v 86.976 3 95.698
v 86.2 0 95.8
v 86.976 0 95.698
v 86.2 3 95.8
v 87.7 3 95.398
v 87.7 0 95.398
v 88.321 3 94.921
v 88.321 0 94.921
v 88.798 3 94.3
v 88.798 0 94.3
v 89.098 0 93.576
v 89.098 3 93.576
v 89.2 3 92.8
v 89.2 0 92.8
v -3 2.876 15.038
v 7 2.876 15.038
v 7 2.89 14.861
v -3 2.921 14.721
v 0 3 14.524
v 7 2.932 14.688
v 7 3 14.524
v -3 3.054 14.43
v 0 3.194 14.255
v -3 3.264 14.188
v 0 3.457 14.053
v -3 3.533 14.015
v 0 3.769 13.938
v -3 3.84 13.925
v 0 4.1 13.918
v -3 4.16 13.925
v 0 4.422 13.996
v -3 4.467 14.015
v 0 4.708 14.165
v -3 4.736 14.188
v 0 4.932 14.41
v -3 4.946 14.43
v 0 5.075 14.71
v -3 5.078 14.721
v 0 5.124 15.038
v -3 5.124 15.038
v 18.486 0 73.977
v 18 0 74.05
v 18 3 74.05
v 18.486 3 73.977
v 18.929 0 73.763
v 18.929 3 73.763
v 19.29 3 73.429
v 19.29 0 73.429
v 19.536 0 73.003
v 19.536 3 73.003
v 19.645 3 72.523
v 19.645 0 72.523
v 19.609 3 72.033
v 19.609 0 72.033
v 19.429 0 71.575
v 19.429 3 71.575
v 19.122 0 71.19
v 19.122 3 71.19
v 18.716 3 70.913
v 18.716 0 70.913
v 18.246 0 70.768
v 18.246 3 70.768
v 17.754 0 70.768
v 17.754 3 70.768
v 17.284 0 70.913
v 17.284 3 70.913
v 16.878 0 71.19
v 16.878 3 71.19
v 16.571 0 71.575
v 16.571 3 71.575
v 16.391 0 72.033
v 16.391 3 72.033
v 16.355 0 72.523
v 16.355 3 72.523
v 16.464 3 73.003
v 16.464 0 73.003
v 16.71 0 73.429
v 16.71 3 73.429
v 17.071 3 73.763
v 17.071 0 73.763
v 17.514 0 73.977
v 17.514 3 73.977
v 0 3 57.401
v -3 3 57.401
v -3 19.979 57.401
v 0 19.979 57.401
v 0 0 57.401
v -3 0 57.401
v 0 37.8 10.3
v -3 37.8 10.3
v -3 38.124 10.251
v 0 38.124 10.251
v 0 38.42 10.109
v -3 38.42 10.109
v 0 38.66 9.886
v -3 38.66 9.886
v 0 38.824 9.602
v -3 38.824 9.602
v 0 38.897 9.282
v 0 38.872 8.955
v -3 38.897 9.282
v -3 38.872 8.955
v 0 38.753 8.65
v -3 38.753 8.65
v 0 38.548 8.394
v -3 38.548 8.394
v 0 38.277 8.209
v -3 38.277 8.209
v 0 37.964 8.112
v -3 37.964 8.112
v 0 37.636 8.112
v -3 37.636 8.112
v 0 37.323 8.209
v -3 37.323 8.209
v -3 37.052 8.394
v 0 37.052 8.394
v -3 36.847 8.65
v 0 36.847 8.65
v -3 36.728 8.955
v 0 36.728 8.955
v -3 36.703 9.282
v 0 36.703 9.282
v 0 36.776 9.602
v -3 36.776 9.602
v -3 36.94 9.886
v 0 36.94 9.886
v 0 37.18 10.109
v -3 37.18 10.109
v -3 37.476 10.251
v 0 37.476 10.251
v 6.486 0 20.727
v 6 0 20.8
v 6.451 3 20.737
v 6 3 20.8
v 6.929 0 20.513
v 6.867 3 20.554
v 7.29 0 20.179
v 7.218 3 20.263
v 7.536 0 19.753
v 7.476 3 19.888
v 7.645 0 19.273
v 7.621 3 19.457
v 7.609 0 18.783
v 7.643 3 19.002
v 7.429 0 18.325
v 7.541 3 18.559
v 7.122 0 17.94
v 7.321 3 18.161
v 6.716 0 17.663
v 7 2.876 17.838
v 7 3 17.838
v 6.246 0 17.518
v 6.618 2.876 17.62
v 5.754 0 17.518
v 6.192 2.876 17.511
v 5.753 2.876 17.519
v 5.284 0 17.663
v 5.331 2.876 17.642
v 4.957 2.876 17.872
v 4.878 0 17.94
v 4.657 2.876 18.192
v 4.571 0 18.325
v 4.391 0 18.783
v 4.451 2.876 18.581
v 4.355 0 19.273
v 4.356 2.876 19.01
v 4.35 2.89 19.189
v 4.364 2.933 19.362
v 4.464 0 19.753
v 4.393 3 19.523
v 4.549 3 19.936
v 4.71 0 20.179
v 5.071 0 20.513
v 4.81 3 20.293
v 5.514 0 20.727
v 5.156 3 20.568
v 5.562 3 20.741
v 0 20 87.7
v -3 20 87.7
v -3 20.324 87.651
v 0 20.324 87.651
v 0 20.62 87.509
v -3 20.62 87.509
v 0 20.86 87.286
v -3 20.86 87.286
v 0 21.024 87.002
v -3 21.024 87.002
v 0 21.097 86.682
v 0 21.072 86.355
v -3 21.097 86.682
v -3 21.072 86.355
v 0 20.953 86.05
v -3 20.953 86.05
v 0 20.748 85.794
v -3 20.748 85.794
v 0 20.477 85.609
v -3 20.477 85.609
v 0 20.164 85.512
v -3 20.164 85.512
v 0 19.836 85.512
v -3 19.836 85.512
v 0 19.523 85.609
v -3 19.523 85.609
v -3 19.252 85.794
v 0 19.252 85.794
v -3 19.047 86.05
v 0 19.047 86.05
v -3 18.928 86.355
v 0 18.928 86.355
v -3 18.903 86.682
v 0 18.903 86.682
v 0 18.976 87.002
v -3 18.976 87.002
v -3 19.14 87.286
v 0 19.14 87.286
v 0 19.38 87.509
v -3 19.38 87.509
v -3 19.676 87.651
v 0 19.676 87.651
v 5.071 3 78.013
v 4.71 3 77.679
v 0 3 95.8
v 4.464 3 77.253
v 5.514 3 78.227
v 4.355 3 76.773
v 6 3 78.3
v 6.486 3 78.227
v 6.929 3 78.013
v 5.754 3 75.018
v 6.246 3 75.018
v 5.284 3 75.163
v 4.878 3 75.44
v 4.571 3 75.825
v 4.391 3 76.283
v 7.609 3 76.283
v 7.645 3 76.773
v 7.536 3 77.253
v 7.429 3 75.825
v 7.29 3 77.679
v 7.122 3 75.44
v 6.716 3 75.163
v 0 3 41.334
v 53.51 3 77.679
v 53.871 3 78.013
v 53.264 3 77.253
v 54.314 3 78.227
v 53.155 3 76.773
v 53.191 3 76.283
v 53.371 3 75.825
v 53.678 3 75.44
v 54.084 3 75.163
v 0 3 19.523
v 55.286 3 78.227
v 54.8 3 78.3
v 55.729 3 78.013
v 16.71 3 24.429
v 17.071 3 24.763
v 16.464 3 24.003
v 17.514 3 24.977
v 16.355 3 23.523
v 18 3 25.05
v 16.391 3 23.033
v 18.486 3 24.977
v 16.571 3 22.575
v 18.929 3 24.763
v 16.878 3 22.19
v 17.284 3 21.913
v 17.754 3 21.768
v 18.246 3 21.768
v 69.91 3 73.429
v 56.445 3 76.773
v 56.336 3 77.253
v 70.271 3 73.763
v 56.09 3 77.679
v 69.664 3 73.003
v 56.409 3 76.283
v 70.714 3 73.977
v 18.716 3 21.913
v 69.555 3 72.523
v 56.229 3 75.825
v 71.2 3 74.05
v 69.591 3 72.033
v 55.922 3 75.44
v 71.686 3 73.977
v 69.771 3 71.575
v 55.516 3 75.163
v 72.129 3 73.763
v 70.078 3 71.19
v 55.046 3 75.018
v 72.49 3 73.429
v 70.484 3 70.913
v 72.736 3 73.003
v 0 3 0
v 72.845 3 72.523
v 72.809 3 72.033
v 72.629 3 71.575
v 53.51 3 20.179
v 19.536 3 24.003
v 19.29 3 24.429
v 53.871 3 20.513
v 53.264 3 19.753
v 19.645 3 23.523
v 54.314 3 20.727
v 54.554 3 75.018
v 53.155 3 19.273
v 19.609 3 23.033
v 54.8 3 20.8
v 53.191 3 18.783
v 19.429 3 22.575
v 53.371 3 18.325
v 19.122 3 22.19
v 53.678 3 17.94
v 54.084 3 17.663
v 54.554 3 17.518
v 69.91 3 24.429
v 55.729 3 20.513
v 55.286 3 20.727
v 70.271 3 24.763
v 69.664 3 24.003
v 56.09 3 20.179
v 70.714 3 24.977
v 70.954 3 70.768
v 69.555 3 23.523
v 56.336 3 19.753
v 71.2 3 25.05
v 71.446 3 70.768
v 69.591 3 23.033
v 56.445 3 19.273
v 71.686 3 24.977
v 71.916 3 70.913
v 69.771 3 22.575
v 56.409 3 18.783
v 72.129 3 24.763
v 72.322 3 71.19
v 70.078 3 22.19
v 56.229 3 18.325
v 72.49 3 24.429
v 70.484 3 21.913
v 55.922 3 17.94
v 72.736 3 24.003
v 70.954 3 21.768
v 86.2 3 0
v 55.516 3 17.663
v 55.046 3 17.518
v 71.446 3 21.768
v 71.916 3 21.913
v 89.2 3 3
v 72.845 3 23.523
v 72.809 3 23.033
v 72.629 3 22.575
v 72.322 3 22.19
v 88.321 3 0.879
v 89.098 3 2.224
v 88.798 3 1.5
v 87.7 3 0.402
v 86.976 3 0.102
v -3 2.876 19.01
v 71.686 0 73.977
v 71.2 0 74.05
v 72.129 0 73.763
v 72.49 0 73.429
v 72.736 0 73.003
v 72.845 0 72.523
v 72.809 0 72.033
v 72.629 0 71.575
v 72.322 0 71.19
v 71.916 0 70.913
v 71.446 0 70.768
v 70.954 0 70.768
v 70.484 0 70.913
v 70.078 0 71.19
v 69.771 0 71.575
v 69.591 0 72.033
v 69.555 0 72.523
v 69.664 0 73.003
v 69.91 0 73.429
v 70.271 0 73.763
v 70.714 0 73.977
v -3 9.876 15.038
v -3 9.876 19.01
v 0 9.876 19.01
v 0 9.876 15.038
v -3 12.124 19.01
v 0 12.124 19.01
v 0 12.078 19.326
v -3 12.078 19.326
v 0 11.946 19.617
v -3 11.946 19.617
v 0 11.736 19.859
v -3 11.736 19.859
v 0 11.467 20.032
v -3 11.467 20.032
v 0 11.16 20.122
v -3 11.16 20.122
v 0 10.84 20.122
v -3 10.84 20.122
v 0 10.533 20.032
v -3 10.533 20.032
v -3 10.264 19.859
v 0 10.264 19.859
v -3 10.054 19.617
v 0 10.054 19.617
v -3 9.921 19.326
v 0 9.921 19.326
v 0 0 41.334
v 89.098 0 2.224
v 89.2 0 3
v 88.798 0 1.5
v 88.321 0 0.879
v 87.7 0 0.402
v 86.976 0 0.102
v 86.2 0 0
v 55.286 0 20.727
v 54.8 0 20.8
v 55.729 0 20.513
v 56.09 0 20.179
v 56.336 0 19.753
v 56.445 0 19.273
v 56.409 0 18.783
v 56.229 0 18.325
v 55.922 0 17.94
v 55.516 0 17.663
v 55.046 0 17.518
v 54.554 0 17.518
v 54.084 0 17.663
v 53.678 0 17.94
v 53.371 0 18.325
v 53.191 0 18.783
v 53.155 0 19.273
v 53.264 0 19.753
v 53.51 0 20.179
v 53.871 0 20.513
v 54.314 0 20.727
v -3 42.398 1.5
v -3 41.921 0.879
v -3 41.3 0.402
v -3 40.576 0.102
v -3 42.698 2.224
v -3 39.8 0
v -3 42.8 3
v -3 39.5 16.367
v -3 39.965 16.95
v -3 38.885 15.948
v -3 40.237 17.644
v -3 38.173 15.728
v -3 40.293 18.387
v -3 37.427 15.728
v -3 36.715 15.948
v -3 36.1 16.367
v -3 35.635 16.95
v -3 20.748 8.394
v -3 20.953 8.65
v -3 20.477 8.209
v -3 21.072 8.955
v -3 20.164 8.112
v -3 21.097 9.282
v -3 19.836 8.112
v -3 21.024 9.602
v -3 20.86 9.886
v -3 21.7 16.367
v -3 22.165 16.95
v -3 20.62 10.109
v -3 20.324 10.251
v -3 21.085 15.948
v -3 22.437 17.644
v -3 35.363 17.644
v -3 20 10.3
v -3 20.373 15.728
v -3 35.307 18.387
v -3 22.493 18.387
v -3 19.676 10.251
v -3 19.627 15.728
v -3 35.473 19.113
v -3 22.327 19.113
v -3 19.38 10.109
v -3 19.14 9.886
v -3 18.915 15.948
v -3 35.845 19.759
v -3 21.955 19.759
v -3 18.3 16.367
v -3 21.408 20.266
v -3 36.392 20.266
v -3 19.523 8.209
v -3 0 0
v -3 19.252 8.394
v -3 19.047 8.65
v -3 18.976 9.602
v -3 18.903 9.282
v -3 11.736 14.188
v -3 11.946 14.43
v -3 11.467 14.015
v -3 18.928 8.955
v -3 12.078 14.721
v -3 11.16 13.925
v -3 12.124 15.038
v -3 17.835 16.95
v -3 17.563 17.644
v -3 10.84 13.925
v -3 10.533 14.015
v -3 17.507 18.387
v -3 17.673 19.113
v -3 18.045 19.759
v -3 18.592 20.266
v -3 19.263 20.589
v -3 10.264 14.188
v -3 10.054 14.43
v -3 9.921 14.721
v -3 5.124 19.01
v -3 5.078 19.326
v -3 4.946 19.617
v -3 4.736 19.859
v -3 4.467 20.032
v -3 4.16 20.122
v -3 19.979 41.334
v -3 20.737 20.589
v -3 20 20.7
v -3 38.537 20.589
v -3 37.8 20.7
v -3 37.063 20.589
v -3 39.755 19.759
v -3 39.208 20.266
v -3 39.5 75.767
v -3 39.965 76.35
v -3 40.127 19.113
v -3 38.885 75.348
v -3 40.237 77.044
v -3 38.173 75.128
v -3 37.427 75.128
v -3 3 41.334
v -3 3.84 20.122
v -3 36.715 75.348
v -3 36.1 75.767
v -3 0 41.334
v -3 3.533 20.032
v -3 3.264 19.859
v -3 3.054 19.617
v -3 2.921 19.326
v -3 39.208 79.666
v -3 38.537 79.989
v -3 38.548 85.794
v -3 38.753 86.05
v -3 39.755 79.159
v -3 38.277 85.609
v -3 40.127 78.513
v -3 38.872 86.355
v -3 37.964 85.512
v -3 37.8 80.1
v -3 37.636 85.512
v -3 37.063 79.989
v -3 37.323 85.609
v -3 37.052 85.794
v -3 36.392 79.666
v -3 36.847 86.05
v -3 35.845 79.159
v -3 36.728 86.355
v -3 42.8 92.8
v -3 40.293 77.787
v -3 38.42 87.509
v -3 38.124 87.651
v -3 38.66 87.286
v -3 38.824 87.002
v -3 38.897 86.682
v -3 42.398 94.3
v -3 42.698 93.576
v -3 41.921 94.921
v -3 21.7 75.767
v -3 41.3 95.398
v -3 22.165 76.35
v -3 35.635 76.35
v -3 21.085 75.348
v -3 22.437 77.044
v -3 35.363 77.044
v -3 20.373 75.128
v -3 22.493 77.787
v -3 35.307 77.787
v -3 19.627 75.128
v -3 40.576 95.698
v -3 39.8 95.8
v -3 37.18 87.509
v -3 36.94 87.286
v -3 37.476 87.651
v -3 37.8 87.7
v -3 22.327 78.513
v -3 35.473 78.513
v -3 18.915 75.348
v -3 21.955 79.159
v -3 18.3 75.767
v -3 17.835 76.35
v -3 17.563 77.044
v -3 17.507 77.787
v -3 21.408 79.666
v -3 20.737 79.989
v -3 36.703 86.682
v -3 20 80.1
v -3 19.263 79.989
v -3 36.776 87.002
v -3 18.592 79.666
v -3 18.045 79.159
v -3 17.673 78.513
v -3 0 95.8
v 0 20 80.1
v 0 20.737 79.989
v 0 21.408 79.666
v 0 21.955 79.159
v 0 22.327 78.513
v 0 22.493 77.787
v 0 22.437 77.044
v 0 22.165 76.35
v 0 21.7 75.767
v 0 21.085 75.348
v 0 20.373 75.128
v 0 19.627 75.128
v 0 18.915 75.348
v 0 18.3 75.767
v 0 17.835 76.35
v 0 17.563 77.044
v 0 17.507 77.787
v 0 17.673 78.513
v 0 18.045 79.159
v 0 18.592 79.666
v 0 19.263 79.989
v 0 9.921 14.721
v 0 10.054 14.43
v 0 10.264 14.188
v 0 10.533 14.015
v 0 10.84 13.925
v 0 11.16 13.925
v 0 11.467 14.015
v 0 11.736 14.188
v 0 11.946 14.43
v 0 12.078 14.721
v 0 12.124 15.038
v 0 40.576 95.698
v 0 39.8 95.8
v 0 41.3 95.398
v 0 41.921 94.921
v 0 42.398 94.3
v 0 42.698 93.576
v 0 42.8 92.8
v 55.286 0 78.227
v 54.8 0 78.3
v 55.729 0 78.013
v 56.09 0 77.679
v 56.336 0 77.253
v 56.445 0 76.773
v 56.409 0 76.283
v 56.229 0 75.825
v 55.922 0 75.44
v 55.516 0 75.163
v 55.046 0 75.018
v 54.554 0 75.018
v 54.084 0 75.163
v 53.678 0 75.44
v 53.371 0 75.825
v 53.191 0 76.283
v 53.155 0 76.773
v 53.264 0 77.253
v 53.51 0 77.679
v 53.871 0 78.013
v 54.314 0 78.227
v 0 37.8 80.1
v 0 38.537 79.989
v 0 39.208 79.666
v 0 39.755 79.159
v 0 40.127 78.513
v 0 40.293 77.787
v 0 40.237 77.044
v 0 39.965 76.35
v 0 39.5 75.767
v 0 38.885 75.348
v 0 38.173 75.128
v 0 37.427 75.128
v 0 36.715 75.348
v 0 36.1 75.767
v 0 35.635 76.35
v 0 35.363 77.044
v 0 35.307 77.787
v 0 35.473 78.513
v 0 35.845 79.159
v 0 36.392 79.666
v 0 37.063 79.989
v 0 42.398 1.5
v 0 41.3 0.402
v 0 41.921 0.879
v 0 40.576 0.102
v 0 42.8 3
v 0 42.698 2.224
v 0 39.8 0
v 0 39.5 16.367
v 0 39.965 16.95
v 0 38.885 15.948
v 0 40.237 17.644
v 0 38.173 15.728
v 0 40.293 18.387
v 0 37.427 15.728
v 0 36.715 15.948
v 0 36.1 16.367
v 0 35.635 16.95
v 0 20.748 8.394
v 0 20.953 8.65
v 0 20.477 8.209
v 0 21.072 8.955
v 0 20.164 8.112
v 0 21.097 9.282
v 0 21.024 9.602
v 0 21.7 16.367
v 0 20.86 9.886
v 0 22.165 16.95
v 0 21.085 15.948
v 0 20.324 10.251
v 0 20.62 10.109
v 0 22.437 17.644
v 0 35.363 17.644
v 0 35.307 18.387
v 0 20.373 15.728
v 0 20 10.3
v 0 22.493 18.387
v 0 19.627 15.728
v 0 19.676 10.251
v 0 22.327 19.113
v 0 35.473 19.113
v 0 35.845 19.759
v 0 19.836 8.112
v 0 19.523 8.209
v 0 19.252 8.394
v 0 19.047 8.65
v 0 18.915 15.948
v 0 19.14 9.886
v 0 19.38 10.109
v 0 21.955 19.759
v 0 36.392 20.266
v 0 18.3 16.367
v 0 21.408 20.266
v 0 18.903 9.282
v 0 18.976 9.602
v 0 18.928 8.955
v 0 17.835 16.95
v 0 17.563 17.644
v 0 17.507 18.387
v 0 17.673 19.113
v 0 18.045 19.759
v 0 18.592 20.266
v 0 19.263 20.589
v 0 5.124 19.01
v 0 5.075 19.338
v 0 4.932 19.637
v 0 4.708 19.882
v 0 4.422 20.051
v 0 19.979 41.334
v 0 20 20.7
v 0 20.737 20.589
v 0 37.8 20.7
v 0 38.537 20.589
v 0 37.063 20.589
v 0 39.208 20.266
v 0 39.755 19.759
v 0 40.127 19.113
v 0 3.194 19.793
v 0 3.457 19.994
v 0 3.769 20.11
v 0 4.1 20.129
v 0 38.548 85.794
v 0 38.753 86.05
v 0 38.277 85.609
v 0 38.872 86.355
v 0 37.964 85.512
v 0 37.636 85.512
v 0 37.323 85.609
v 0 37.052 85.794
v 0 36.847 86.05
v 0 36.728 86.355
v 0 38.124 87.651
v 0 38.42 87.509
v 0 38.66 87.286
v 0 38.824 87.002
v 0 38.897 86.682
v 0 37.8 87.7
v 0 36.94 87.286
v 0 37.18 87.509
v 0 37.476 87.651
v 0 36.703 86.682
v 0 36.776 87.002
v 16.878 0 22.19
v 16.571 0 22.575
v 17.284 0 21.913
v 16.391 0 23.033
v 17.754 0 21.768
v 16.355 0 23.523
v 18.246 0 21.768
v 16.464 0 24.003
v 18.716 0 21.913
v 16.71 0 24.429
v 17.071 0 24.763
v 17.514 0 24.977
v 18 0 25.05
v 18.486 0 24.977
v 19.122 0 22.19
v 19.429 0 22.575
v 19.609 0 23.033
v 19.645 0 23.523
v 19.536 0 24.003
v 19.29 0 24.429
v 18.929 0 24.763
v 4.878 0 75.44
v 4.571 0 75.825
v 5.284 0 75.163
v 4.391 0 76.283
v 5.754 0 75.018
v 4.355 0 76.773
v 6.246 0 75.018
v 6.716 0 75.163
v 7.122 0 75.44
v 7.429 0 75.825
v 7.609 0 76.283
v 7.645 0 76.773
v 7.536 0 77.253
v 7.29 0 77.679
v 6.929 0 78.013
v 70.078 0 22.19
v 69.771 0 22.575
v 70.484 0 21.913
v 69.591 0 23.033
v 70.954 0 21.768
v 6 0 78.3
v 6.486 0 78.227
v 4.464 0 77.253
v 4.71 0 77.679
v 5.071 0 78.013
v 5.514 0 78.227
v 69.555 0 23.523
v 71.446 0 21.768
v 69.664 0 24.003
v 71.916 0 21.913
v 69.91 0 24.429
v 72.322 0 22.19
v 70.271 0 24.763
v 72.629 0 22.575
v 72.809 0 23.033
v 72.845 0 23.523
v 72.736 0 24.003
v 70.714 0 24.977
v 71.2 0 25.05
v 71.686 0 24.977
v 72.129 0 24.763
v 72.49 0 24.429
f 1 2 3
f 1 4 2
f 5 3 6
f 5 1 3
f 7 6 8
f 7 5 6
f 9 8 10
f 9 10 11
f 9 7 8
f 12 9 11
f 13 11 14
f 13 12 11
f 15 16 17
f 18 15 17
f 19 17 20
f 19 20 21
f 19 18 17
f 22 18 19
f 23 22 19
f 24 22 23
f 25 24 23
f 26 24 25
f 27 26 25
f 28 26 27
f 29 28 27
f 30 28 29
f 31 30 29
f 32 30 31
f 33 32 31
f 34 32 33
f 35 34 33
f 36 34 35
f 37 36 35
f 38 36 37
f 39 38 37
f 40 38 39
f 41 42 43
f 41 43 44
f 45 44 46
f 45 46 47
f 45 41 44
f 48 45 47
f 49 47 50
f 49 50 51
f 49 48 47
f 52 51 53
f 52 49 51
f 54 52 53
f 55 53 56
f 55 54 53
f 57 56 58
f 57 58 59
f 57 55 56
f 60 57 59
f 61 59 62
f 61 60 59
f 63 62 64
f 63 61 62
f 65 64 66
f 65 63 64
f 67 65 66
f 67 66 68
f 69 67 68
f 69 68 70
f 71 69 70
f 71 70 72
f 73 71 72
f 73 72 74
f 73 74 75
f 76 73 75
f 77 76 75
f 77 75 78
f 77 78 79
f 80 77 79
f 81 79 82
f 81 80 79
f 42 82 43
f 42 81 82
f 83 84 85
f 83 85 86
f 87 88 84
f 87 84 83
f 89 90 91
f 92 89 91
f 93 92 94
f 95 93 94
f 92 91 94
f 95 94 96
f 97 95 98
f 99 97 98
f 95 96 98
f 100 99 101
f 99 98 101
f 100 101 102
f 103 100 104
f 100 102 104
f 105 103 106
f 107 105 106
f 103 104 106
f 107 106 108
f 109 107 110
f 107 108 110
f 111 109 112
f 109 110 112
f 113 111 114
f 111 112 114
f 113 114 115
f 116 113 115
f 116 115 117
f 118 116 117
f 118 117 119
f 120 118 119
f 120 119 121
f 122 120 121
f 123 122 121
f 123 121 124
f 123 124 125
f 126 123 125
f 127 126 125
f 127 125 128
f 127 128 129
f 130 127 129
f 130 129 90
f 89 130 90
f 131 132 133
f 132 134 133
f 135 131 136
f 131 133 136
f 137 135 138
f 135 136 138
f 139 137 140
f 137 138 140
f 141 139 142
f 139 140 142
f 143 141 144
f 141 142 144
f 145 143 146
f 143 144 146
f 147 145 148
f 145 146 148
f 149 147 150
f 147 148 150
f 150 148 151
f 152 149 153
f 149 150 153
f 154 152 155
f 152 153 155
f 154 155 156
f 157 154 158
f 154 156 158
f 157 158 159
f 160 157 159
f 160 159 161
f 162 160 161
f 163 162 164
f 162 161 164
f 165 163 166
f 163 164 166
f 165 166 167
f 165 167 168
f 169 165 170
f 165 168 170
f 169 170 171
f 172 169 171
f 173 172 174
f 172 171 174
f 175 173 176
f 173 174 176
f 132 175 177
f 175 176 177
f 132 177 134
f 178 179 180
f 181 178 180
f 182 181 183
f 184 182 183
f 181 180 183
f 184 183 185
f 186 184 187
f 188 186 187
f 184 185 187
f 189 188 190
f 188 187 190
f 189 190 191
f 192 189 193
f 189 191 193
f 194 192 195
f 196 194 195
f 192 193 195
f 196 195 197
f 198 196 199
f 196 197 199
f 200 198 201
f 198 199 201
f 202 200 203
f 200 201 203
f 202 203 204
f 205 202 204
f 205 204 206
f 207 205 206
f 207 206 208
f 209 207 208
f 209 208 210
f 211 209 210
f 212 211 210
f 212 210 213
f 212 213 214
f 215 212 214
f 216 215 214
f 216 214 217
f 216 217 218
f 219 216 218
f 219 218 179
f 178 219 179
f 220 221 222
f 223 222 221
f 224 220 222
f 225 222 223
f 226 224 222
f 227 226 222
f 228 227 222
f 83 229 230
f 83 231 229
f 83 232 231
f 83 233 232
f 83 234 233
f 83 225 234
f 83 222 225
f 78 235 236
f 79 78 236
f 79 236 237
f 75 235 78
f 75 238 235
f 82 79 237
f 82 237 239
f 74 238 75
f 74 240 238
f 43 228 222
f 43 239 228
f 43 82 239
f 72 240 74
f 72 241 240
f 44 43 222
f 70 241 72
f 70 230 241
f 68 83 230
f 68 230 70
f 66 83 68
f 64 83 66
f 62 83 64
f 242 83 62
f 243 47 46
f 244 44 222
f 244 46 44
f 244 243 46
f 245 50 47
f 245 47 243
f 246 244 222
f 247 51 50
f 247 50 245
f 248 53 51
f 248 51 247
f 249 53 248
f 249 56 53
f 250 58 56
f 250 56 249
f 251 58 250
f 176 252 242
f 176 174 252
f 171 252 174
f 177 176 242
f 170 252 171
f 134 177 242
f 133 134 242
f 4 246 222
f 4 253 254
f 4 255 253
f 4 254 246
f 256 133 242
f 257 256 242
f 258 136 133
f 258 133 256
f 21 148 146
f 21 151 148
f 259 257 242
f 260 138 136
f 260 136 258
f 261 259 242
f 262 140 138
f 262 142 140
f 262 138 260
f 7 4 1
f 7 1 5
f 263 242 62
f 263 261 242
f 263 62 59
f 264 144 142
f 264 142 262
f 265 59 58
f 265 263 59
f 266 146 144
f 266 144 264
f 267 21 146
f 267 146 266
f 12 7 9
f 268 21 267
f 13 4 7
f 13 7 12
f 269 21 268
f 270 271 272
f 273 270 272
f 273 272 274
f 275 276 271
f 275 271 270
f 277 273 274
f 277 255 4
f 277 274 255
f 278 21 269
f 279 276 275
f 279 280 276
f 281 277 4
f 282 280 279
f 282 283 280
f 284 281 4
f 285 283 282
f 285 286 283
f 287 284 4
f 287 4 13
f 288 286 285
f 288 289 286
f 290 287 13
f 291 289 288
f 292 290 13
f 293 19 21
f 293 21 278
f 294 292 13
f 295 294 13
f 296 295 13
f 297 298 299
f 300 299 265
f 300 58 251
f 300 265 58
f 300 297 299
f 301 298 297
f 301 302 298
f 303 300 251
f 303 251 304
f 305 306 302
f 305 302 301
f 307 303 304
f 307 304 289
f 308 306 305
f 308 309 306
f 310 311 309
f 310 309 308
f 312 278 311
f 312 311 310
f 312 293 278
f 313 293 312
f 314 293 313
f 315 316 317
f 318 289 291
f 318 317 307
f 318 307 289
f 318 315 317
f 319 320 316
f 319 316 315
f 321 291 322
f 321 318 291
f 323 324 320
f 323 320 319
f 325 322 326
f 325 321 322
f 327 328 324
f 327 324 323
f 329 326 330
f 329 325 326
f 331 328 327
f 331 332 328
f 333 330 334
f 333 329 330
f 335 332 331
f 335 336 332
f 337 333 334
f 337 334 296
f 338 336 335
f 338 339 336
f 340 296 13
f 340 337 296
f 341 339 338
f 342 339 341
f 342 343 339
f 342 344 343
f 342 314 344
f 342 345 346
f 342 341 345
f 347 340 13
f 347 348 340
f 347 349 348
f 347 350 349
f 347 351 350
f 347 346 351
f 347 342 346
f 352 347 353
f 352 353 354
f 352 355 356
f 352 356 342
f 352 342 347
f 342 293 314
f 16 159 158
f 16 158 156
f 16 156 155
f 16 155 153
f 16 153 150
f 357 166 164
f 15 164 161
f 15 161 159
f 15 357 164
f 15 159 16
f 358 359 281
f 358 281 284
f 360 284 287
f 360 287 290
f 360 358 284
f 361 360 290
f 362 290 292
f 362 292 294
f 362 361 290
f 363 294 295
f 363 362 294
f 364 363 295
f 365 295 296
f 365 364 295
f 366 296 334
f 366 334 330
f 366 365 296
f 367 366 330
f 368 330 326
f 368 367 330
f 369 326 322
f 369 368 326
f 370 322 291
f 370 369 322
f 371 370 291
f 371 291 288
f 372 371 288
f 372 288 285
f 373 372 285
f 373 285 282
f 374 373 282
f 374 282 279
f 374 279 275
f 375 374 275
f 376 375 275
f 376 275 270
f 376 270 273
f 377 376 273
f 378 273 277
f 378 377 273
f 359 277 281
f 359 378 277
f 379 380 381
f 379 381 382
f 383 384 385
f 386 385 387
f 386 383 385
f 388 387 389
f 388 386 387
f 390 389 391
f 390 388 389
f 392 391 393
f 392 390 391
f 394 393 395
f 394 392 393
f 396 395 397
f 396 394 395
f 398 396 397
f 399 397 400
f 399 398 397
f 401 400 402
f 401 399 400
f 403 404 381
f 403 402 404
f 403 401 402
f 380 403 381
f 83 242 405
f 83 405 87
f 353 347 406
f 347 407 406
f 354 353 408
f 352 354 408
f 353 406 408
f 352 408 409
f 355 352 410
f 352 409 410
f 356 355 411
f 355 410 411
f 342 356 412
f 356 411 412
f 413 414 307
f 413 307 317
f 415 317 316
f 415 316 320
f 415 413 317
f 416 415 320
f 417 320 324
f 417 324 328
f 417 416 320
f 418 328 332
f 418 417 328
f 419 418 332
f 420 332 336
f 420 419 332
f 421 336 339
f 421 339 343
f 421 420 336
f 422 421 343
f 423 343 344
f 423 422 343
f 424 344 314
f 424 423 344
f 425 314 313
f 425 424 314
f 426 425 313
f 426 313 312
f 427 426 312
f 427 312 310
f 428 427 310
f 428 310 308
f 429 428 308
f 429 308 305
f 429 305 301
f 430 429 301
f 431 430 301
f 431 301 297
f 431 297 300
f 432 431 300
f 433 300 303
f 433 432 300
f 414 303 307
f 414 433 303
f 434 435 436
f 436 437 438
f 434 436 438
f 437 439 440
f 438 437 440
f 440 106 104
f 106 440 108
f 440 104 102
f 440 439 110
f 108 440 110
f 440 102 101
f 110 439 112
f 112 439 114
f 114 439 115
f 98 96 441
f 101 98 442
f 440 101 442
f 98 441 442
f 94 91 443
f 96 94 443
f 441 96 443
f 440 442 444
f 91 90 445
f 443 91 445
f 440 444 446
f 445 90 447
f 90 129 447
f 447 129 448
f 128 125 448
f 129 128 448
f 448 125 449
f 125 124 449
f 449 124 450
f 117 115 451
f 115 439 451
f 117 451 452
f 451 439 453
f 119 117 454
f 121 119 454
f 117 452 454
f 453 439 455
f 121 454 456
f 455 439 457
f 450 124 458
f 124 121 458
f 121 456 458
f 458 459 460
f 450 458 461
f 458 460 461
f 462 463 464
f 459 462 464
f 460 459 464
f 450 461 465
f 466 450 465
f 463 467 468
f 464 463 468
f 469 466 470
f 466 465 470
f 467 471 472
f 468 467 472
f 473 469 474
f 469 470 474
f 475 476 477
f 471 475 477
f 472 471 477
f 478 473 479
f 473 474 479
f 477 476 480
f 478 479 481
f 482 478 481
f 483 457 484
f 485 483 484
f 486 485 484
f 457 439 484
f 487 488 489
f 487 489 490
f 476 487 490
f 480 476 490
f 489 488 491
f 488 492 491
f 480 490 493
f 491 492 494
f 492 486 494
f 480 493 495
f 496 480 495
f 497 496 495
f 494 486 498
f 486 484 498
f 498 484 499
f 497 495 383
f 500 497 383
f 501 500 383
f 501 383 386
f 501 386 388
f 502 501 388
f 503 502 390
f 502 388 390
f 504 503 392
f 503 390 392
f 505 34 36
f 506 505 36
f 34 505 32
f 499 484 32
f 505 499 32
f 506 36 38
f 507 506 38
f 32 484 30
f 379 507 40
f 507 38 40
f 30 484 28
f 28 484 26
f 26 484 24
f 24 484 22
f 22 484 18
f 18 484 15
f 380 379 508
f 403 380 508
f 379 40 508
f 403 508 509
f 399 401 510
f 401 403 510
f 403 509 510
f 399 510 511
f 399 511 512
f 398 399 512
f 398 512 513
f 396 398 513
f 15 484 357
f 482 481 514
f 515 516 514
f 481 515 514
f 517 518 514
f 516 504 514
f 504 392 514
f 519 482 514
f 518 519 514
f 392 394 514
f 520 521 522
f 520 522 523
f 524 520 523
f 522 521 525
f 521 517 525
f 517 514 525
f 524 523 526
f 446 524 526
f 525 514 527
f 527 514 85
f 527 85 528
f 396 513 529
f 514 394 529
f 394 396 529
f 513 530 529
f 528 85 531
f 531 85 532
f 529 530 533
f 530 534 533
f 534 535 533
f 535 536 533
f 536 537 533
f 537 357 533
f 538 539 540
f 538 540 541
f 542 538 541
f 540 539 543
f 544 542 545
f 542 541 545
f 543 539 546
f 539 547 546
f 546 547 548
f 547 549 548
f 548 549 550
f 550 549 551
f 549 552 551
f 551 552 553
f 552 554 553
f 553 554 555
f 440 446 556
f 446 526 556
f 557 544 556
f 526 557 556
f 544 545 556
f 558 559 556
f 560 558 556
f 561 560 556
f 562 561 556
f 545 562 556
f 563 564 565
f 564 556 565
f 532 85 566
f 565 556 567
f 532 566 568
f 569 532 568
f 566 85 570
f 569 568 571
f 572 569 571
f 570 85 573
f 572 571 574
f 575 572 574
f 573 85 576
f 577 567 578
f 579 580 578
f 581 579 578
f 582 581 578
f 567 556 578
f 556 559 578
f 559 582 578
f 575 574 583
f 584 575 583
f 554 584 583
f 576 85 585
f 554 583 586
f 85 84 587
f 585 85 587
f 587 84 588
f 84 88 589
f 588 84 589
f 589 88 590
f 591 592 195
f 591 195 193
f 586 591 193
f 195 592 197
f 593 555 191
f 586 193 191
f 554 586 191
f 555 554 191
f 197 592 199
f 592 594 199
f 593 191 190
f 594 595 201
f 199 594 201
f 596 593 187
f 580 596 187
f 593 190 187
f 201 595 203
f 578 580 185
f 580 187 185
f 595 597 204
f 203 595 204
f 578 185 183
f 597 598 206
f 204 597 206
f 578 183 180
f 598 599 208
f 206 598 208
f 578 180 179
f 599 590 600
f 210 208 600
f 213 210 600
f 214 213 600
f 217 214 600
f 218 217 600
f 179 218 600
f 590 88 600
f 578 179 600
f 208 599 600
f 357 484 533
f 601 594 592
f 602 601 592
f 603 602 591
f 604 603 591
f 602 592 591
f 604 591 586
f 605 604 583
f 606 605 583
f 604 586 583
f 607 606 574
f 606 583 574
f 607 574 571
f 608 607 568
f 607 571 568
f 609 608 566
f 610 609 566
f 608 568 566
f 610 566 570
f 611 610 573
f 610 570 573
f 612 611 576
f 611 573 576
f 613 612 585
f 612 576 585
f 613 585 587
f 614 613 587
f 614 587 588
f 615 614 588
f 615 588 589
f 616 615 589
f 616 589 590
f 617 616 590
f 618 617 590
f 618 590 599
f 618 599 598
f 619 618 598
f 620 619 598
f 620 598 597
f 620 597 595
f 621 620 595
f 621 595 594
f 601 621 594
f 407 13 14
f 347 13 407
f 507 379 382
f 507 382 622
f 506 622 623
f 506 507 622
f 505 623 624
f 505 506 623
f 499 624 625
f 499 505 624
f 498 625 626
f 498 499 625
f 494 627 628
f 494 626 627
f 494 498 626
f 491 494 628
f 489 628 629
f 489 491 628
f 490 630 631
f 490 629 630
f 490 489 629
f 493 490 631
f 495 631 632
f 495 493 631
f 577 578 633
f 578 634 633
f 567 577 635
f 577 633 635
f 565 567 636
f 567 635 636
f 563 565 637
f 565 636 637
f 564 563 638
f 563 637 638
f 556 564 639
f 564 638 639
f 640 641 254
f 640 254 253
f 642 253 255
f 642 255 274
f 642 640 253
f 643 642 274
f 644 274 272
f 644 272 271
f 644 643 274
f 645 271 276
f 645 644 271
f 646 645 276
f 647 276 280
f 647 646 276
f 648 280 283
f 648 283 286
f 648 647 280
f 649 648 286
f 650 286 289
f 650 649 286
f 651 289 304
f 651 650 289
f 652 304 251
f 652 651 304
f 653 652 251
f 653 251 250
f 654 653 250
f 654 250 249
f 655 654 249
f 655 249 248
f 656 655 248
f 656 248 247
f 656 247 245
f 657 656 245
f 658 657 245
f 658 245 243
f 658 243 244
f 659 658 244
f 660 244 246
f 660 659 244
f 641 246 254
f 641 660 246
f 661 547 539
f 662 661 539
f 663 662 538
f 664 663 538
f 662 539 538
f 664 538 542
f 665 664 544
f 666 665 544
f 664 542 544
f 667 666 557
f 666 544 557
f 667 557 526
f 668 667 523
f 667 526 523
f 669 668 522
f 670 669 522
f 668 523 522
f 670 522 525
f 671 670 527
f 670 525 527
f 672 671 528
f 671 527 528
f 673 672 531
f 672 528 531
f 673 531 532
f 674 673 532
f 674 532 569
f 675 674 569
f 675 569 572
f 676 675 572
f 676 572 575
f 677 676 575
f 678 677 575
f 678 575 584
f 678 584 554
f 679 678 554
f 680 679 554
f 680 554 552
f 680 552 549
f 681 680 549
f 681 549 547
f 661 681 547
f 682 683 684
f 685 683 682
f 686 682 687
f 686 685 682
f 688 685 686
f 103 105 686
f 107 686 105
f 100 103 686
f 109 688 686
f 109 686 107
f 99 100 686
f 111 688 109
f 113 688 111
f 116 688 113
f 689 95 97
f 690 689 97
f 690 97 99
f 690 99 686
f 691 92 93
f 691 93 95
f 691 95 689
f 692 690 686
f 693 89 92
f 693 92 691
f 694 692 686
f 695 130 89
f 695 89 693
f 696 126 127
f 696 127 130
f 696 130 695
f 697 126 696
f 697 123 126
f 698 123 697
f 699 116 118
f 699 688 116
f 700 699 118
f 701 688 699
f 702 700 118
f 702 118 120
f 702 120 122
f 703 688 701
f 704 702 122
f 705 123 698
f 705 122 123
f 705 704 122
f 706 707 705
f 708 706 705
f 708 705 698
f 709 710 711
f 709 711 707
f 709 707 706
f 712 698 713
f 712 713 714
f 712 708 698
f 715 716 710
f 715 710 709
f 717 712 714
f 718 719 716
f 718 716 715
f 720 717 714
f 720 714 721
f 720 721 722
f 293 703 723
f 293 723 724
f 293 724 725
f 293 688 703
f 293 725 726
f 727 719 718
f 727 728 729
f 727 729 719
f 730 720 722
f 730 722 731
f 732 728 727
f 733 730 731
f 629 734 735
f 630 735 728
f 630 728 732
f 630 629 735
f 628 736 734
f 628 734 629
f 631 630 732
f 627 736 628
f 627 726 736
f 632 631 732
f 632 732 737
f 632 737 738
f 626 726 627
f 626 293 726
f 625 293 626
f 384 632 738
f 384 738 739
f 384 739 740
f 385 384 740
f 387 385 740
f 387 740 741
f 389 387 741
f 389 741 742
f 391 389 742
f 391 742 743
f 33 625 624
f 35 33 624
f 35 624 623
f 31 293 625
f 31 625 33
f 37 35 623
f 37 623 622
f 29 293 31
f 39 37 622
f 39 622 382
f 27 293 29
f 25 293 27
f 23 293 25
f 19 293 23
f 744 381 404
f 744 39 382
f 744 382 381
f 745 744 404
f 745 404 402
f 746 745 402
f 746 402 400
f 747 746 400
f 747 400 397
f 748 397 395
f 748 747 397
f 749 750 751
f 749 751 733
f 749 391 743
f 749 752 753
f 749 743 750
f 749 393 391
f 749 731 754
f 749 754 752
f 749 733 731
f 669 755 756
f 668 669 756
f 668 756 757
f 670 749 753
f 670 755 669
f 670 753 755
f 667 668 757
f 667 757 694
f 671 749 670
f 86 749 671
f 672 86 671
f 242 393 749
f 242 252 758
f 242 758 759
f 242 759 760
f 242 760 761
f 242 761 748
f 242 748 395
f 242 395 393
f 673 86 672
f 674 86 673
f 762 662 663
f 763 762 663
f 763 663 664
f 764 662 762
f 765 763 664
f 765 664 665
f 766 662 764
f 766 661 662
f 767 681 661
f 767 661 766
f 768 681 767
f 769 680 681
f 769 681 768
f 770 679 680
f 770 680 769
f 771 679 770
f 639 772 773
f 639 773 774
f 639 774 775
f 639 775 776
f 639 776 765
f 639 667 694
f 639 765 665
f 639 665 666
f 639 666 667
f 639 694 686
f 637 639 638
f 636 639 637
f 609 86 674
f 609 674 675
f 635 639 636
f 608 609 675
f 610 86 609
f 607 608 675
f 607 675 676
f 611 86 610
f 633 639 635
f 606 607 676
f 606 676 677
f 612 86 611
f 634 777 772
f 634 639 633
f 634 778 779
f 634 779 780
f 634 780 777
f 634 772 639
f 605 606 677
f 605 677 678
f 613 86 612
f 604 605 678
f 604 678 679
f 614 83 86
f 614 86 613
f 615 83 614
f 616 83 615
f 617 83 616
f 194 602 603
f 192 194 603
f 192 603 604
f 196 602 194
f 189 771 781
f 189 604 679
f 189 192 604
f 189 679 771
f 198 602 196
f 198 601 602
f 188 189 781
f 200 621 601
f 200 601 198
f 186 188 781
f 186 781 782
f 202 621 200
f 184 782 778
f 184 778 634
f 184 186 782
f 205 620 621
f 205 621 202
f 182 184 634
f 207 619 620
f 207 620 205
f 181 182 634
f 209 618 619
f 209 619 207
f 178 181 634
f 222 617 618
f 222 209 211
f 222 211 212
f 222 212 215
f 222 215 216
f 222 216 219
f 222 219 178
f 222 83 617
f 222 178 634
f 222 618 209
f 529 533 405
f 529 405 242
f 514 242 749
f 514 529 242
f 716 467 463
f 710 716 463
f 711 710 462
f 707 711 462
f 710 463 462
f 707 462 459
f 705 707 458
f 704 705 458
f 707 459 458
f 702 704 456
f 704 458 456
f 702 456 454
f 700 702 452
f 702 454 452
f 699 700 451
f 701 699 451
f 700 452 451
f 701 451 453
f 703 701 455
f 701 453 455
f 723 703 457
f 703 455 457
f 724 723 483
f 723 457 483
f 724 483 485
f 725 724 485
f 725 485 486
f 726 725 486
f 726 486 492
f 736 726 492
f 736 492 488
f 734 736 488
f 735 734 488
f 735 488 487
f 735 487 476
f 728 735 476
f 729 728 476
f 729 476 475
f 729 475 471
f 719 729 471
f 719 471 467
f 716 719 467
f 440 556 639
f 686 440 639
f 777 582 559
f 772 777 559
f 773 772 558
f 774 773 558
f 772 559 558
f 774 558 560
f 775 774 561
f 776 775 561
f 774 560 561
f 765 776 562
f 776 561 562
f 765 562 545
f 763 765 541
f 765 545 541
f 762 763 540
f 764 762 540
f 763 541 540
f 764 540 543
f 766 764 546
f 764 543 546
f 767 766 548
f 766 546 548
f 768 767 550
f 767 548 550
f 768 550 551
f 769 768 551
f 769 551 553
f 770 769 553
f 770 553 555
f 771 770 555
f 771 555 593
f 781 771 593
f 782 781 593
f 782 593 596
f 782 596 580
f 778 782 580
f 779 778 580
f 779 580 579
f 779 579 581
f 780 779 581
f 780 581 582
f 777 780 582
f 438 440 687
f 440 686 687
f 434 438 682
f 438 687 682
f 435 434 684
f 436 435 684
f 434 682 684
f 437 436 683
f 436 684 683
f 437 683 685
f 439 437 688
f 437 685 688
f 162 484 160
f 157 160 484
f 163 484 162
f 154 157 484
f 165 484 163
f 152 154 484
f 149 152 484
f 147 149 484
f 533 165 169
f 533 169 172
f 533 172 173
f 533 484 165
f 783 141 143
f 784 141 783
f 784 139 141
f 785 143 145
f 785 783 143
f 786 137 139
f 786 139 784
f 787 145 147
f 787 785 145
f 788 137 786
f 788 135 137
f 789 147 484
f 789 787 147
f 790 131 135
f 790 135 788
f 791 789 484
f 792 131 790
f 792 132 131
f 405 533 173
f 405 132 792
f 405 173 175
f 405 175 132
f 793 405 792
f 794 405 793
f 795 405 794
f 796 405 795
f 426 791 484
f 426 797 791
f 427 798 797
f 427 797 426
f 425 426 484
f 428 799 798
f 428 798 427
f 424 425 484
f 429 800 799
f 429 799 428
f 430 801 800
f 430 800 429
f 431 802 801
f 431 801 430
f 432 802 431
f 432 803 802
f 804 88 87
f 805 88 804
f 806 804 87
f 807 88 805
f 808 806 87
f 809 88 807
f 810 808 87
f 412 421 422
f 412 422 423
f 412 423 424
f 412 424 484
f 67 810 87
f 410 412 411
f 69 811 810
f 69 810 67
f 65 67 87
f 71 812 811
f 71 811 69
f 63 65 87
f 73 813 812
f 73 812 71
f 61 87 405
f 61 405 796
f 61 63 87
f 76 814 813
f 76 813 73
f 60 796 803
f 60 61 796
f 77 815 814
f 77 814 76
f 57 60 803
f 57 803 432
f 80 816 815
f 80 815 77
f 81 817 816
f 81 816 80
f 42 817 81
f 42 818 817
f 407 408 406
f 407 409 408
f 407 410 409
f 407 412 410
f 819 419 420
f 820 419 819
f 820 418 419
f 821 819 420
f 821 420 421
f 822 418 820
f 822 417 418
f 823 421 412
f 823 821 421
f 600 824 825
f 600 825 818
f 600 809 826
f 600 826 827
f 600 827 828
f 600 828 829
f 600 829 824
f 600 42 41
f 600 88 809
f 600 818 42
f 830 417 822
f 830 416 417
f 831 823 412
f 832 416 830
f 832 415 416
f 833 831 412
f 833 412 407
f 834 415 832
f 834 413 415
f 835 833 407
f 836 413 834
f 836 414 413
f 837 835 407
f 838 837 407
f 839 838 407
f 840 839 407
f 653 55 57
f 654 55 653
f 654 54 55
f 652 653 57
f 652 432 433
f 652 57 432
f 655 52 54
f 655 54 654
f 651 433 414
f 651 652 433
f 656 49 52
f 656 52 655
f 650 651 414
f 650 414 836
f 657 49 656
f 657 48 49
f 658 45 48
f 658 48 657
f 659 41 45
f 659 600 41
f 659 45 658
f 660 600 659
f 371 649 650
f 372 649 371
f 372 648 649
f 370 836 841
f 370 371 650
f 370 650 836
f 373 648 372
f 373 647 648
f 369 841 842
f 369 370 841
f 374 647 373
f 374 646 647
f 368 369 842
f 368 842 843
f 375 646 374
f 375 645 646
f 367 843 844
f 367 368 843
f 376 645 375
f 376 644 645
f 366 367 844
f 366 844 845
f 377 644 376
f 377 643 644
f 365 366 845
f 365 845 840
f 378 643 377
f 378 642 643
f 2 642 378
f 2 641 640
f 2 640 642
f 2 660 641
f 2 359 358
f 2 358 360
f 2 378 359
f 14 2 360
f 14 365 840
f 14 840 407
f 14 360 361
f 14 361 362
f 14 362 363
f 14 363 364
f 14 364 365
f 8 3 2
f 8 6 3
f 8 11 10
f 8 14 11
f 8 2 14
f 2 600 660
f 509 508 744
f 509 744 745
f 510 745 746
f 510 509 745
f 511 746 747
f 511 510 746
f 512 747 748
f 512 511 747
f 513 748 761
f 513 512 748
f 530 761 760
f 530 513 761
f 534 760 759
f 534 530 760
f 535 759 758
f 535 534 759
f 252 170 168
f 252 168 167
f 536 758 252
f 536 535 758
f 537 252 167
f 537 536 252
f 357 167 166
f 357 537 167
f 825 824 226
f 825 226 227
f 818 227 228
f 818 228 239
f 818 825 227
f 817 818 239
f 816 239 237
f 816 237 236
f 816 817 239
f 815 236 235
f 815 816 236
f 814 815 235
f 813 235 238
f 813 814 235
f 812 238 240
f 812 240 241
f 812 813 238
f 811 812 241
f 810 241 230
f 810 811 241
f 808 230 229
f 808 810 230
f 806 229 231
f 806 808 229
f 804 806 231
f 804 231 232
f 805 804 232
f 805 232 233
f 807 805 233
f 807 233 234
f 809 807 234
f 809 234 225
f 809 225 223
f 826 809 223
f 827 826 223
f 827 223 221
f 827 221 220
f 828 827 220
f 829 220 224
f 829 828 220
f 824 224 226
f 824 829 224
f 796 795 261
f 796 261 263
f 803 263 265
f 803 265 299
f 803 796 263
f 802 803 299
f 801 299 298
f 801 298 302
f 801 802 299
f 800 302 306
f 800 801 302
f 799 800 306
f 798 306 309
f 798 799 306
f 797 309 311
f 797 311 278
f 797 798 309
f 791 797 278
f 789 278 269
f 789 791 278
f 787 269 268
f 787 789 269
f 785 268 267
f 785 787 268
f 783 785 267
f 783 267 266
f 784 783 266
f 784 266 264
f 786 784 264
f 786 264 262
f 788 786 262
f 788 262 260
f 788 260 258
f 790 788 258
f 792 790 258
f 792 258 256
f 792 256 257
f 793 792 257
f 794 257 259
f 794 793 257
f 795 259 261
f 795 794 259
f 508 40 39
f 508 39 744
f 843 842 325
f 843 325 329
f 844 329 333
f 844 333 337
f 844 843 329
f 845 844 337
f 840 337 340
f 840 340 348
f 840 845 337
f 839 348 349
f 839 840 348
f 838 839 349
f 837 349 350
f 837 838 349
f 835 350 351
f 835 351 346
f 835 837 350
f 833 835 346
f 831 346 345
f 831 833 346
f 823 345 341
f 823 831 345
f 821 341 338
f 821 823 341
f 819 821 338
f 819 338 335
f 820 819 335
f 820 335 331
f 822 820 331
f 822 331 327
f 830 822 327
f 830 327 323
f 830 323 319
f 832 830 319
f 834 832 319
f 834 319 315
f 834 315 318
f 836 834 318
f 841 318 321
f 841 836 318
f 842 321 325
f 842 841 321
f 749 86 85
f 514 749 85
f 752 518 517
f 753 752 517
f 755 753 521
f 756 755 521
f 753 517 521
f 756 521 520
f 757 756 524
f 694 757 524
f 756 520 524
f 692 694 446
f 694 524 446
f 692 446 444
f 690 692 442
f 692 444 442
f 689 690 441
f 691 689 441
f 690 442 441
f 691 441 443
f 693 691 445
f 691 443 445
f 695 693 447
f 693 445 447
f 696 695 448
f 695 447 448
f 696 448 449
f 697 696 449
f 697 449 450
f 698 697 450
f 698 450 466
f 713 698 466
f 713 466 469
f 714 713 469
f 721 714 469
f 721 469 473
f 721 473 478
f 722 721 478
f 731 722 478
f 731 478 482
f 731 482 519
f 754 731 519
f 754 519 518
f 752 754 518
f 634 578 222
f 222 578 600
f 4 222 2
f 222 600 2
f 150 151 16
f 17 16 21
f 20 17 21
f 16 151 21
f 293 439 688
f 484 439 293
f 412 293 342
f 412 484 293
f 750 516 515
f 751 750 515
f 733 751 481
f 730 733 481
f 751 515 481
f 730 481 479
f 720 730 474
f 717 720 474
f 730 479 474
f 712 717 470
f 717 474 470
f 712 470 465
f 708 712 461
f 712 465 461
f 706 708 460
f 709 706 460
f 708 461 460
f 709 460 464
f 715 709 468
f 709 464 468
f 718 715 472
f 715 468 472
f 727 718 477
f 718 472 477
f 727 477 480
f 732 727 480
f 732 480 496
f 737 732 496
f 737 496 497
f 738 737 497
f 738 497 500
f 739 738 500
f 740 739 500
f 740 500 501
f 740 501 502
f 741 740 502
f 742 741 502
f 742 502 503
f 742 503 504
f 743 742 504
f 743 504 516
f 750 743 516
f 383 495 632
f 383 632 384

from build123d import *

# Parameters (mm, degrees)
SKETCH_3_W           = 89.2
SKETCH_3_H           = 95.8
SKETCH_3_R           = 1.65
EXTRUDE_1_DEPTH      = 3
EXTRUDE_1_DEPTH_BACK = 0.0001
SKETCH_6_W           = 3
SKETCH_6_H           = 95.8
EXTRUDE_3_DEPTH      = 42.8
SKETCH_8_R           = 1.1
CUT_EXTRUDE_6_DEPTH  = 47.8
SKETCH_8_9_R         = 1.1
CUT_EXTRUDE_7_DEPTH  = 47.8
SKETCH_8_10_R        = 1.1
CUT_EXTRUDE_8_DEPTH  = 47.8
SKETCH_8_11_R        = 1.1
CUT_EXTRUDE_9_DEPTH  = 47.8
SKETCH_12_R          = 2.5
CUT_EXTRUDE_10_DEPTH = 47.8
SKETCH_12_4_R        = 2.5
CUT_EXTRUDE_11_DEPTH = 47.8
CUT_EXTRUDE_21_DEPTH = 19.978934005
SKETCH_16_W          = 3
SKETCH_16_H          = 16.067623689
EXTRUDE_4_DEPTH      = 3
SKETCH_17_W          = 16.067623689
SKETCH_17_H          = 3
CUT_EXTRUDE_22_DEPTH = 3
CUT_EXTRUDE_23_DEPTH = 10
FILLET_1_R           = 3
FILLET_2_R           = 3
FILLET_3_R           = 3
FILLET_4_R           = 3


with BuildPart() as part:
    # Sketch 3 → Extrude 1 (new body, two sides)
    with BuildSketch(Plane(origin=(0, 0, 0), x_dir=(1, 0, 0), z_dir=(0, 1, 0))) as extrude_1_sk:
        with Locations((44.6, -47.9)):
            Rectangle(SKETCH_3_W, SKETCH_3_H)
        with Locations(Location((18, -23.4, 0), (0, 0, 270))):  # turned: the seam where the file's is
            Circle(SKETCH_3_R, mode=Mode.SUBTRACT)
        with Locations(Location((71.2, -23.4, 0), (0, 0, 270))):  # turned: the seam where the file's is
            Circle(SKETCH_3_R, mode=Mode.SUBTRACT)
        with Locations(Location((18, -72.4, 0), (0, 0, 270))):  # turned: the seam where the file's is
            Circle(SKETCH_3_R, mode=Mode.SUBTRACT)
        with Locations(Location((71.2, -72.4, 0), (0, 0, 270))):  # turned: the seam where the file's is
            Circle(SKETCH_3_R, mode=Mode.SUBTRACT)
        with Locations(Location((6, -19.15, 0), (0, 0, 270))):  # turned: the seam where the file's is
            Circle(SKETCH_3_R, mode=Mode.SUBTRACT)
        with Locations(Location((54.8, -19.15, 0), (0, 0, 270))):  # turned: the seam where the file's is
            Circle(SKETCH_3_R, mode=Mode.SUBTRACT)
        with Locations(Location((6, -76.65, 0), (0, 0, 270))):  # turned: the seam where the file's is
            Circle(SKETCH_3_R, mode=Mode.SUBTRACT)
        with Locations(Location((54.8, -76.65, 0), (0, 0, 270))):  # turned: the seam where the file's is
            Circle(SKETCH_3_R, mode=Mode.SUBTRACT)
    extrude(amount=EXTRUDE_1_DEPTH)
    extrude(extrude_1_sk.sketch, amount=-EXTRUDE_1_DEPTH_BACK)

    # Sketch 6 → Extrude 3 (add)
    with BuildSketch(Plane.XZ.offset(0.0001)):
        with Locations((-1.5, 47.9)):
            Rectangle(SKETCH_6_W, SKETCH_6_H)
    extrude(amount=-EXTRUDE_3_DEPTH)

    # Sketch 8 → Cut-Extrude 6 (cut)
    with BuildSketch(Plane.ZY.offset(3)):
        with Locations((86.6, 37.8)):
            Circle(SKETCH_8_R)
    extrude(amount=-CUT_EXTRUDE_6_DEPTH, mode=Mode.SUBTRACT)

    # Sketch 8_9 → Cut-Extrude 7 (cut)
    with BuildSketch(Plane.ZY.offset(3)):
        with Locations((9.2, 37.8)):
            Circle(SKETCH_8_9_R)
    extrude(amount=-CUT_EXTRUDE_7_DEPTH, mode=Mode.SUBTRACT)

    # Sketch 8_10 → Cut-Extrude 8 (cut)
    with BuildSketch(Plane.ZY.offset(3)):
        with Locations((9.2, 20)):
            Circle(SKETCH_8_10_R)
    extrude(amount=-CUT_EXTRUDE_8_DEPTH, mode=Mode.SUBTRACT)

    # Sketch 8_11 → Cut-Extrude 9 (cut)
    with BuildSketch(Plane.ZY.offset(3)):
        with Locations((86.6, 20)):
            Circle(SKETCH_8_11_R)
    extrude(amount=-CUT_EXTRUDE_9_DEPTH, mode=Mode.SUBTRACT)

    # Sketch 12 → Cut-Extrude 10 (cut)
    with BuildSketch(Plane.ZY.offset(3)):
        with Locations((18.2, 37.8)):
            Circle(SKETCH_12_R)
    extrude(amount=-CUT_EXTRUDE_10_DEPTH, mode=Mode.SUBTRACT)

    # Sketch 12_4 → Cut-Extrude 11 (cut)
    with BuildSketch(Plane.ZY.offset(3)):
        with Locations((77.6, 37.8)):
            Circle(SKETCH_12_4_R)
        with Locations((77.6, 20)):
            Circle(SKETCH_12_4_R)
        with Locations((18.2, 37.8)):
            Circle(SKETCH_12_4_R)
        with Locations((18.2, 20)):
            Circle(SKETCH_12_4_R)
    extrude(amount=-CUT_EXTRUDE_11_DEPTH, mode=Mode.SUBTRACT)

    # Sketch 13 → Cut-Extrude 21 (cut)
    with BuildSketch(Plane.XZ.offset(0.0001)):
        Polygon((-5, 47.9), (-5, 57.401139719), (0, 57.401139719), (0, 41.33351603), (-5, 41.33351603), align=None)
    extrude(amount=-CUT_EXTRUDE_21_DEPTH, mode=Mode.SUBTRACT)

    # Sketch 16 → Extrude 4 (add)
    with BuildSketch(Plane.XZ.offset(0.0001)):
        with Locations((-1.5, 49.367327875)):
            Rectangle(SKETCH_16_W, SKETCH_16_H)
    extrude(amount=-EXTRUDE_4_DEPTH)

    # Sketch 17 → Cut-Extrude 22 (cut)
    with BuildSketch(Plane.ZY.offset(3)):
        with Locations((49.367327875, 1.4999)):
            Rectangle(SKETCH_17_W, SKETCH_17_H)
    extrude(amount=-CUT_EXTRUDE_22_DEPTH, mode=Mode.SUBTRACT)

    # Sketch 18 → Cut-Extrude 23 (cut)
    with BuildSketch(Plane.ZY.offset(3)):
        with BuildLine():
            Line((19.009554581, 2.875833037), (15.037851313, 2.875833037))
            ThreePointArc((15.037851313, 2.875833037), (13.91378435, 3.9999), (15.037851313, 5.123966963))
            Line((15.037851313, 5.123966963), (19.009554581, 5.123966963))
            ThreePointArc((19.009554581, 5.123966963), (20.133621543, 3.9999), (19.009554581, 2.875833037))
        make_face()
        with BuildLine():
            Line((15.037851313, 12.123966963), (19.009554581, 12.123966963))
            ThreePointArc((19.009554581, 12.123966963), (20.133621543, 10.9999), (19.009554581, 9.875833037))
            Line((19.009554581, 9.875833037), (15.037851313, 9.875833037))
            ThreePointArc((15.037851313, 9.875833037), (13.91378435, 10.9999), (15.037851313, 12.123966963))
        make_face()
    extrude(amount=-CUT_EXTRUDE_23_DEPTH, mode=Mode.SUBTRACT)

    # Fillet 1
    fillet_1_edges = [part.edges().sort_by_distance(p)[0] for p in [
        (-1.5, 42.7999, 95.8),
    ]]
    fillet(fillet_1_edges, radius=FILLET_1_R)

    # Fillet 2
    fillet_2_edges = [part.edges().sort_by_distance(p)[0] for p in [
        (-1.5, 42.7999, 0),
    ]]
    fillet(fillet_2_edges, radius=FILLET_2_R)

    # Fillet 3
    fillet_3_edges = [part.edges().sort_by_distance(p)[0] for p in [
        (89.2, 1.49995, 95.8),
    ]]
    fillet(fillet_3_edges, radius=FILLET_3_R)

    # Fillet 4
    fillet_4_edges = [part.edges().sort_by_distance(p)[0] for p in [
        (89.2, 1.49995, 0),
    ]]
    fillet(fillet_4_edges, radius=FILLET_4_R)


solid = part.part
